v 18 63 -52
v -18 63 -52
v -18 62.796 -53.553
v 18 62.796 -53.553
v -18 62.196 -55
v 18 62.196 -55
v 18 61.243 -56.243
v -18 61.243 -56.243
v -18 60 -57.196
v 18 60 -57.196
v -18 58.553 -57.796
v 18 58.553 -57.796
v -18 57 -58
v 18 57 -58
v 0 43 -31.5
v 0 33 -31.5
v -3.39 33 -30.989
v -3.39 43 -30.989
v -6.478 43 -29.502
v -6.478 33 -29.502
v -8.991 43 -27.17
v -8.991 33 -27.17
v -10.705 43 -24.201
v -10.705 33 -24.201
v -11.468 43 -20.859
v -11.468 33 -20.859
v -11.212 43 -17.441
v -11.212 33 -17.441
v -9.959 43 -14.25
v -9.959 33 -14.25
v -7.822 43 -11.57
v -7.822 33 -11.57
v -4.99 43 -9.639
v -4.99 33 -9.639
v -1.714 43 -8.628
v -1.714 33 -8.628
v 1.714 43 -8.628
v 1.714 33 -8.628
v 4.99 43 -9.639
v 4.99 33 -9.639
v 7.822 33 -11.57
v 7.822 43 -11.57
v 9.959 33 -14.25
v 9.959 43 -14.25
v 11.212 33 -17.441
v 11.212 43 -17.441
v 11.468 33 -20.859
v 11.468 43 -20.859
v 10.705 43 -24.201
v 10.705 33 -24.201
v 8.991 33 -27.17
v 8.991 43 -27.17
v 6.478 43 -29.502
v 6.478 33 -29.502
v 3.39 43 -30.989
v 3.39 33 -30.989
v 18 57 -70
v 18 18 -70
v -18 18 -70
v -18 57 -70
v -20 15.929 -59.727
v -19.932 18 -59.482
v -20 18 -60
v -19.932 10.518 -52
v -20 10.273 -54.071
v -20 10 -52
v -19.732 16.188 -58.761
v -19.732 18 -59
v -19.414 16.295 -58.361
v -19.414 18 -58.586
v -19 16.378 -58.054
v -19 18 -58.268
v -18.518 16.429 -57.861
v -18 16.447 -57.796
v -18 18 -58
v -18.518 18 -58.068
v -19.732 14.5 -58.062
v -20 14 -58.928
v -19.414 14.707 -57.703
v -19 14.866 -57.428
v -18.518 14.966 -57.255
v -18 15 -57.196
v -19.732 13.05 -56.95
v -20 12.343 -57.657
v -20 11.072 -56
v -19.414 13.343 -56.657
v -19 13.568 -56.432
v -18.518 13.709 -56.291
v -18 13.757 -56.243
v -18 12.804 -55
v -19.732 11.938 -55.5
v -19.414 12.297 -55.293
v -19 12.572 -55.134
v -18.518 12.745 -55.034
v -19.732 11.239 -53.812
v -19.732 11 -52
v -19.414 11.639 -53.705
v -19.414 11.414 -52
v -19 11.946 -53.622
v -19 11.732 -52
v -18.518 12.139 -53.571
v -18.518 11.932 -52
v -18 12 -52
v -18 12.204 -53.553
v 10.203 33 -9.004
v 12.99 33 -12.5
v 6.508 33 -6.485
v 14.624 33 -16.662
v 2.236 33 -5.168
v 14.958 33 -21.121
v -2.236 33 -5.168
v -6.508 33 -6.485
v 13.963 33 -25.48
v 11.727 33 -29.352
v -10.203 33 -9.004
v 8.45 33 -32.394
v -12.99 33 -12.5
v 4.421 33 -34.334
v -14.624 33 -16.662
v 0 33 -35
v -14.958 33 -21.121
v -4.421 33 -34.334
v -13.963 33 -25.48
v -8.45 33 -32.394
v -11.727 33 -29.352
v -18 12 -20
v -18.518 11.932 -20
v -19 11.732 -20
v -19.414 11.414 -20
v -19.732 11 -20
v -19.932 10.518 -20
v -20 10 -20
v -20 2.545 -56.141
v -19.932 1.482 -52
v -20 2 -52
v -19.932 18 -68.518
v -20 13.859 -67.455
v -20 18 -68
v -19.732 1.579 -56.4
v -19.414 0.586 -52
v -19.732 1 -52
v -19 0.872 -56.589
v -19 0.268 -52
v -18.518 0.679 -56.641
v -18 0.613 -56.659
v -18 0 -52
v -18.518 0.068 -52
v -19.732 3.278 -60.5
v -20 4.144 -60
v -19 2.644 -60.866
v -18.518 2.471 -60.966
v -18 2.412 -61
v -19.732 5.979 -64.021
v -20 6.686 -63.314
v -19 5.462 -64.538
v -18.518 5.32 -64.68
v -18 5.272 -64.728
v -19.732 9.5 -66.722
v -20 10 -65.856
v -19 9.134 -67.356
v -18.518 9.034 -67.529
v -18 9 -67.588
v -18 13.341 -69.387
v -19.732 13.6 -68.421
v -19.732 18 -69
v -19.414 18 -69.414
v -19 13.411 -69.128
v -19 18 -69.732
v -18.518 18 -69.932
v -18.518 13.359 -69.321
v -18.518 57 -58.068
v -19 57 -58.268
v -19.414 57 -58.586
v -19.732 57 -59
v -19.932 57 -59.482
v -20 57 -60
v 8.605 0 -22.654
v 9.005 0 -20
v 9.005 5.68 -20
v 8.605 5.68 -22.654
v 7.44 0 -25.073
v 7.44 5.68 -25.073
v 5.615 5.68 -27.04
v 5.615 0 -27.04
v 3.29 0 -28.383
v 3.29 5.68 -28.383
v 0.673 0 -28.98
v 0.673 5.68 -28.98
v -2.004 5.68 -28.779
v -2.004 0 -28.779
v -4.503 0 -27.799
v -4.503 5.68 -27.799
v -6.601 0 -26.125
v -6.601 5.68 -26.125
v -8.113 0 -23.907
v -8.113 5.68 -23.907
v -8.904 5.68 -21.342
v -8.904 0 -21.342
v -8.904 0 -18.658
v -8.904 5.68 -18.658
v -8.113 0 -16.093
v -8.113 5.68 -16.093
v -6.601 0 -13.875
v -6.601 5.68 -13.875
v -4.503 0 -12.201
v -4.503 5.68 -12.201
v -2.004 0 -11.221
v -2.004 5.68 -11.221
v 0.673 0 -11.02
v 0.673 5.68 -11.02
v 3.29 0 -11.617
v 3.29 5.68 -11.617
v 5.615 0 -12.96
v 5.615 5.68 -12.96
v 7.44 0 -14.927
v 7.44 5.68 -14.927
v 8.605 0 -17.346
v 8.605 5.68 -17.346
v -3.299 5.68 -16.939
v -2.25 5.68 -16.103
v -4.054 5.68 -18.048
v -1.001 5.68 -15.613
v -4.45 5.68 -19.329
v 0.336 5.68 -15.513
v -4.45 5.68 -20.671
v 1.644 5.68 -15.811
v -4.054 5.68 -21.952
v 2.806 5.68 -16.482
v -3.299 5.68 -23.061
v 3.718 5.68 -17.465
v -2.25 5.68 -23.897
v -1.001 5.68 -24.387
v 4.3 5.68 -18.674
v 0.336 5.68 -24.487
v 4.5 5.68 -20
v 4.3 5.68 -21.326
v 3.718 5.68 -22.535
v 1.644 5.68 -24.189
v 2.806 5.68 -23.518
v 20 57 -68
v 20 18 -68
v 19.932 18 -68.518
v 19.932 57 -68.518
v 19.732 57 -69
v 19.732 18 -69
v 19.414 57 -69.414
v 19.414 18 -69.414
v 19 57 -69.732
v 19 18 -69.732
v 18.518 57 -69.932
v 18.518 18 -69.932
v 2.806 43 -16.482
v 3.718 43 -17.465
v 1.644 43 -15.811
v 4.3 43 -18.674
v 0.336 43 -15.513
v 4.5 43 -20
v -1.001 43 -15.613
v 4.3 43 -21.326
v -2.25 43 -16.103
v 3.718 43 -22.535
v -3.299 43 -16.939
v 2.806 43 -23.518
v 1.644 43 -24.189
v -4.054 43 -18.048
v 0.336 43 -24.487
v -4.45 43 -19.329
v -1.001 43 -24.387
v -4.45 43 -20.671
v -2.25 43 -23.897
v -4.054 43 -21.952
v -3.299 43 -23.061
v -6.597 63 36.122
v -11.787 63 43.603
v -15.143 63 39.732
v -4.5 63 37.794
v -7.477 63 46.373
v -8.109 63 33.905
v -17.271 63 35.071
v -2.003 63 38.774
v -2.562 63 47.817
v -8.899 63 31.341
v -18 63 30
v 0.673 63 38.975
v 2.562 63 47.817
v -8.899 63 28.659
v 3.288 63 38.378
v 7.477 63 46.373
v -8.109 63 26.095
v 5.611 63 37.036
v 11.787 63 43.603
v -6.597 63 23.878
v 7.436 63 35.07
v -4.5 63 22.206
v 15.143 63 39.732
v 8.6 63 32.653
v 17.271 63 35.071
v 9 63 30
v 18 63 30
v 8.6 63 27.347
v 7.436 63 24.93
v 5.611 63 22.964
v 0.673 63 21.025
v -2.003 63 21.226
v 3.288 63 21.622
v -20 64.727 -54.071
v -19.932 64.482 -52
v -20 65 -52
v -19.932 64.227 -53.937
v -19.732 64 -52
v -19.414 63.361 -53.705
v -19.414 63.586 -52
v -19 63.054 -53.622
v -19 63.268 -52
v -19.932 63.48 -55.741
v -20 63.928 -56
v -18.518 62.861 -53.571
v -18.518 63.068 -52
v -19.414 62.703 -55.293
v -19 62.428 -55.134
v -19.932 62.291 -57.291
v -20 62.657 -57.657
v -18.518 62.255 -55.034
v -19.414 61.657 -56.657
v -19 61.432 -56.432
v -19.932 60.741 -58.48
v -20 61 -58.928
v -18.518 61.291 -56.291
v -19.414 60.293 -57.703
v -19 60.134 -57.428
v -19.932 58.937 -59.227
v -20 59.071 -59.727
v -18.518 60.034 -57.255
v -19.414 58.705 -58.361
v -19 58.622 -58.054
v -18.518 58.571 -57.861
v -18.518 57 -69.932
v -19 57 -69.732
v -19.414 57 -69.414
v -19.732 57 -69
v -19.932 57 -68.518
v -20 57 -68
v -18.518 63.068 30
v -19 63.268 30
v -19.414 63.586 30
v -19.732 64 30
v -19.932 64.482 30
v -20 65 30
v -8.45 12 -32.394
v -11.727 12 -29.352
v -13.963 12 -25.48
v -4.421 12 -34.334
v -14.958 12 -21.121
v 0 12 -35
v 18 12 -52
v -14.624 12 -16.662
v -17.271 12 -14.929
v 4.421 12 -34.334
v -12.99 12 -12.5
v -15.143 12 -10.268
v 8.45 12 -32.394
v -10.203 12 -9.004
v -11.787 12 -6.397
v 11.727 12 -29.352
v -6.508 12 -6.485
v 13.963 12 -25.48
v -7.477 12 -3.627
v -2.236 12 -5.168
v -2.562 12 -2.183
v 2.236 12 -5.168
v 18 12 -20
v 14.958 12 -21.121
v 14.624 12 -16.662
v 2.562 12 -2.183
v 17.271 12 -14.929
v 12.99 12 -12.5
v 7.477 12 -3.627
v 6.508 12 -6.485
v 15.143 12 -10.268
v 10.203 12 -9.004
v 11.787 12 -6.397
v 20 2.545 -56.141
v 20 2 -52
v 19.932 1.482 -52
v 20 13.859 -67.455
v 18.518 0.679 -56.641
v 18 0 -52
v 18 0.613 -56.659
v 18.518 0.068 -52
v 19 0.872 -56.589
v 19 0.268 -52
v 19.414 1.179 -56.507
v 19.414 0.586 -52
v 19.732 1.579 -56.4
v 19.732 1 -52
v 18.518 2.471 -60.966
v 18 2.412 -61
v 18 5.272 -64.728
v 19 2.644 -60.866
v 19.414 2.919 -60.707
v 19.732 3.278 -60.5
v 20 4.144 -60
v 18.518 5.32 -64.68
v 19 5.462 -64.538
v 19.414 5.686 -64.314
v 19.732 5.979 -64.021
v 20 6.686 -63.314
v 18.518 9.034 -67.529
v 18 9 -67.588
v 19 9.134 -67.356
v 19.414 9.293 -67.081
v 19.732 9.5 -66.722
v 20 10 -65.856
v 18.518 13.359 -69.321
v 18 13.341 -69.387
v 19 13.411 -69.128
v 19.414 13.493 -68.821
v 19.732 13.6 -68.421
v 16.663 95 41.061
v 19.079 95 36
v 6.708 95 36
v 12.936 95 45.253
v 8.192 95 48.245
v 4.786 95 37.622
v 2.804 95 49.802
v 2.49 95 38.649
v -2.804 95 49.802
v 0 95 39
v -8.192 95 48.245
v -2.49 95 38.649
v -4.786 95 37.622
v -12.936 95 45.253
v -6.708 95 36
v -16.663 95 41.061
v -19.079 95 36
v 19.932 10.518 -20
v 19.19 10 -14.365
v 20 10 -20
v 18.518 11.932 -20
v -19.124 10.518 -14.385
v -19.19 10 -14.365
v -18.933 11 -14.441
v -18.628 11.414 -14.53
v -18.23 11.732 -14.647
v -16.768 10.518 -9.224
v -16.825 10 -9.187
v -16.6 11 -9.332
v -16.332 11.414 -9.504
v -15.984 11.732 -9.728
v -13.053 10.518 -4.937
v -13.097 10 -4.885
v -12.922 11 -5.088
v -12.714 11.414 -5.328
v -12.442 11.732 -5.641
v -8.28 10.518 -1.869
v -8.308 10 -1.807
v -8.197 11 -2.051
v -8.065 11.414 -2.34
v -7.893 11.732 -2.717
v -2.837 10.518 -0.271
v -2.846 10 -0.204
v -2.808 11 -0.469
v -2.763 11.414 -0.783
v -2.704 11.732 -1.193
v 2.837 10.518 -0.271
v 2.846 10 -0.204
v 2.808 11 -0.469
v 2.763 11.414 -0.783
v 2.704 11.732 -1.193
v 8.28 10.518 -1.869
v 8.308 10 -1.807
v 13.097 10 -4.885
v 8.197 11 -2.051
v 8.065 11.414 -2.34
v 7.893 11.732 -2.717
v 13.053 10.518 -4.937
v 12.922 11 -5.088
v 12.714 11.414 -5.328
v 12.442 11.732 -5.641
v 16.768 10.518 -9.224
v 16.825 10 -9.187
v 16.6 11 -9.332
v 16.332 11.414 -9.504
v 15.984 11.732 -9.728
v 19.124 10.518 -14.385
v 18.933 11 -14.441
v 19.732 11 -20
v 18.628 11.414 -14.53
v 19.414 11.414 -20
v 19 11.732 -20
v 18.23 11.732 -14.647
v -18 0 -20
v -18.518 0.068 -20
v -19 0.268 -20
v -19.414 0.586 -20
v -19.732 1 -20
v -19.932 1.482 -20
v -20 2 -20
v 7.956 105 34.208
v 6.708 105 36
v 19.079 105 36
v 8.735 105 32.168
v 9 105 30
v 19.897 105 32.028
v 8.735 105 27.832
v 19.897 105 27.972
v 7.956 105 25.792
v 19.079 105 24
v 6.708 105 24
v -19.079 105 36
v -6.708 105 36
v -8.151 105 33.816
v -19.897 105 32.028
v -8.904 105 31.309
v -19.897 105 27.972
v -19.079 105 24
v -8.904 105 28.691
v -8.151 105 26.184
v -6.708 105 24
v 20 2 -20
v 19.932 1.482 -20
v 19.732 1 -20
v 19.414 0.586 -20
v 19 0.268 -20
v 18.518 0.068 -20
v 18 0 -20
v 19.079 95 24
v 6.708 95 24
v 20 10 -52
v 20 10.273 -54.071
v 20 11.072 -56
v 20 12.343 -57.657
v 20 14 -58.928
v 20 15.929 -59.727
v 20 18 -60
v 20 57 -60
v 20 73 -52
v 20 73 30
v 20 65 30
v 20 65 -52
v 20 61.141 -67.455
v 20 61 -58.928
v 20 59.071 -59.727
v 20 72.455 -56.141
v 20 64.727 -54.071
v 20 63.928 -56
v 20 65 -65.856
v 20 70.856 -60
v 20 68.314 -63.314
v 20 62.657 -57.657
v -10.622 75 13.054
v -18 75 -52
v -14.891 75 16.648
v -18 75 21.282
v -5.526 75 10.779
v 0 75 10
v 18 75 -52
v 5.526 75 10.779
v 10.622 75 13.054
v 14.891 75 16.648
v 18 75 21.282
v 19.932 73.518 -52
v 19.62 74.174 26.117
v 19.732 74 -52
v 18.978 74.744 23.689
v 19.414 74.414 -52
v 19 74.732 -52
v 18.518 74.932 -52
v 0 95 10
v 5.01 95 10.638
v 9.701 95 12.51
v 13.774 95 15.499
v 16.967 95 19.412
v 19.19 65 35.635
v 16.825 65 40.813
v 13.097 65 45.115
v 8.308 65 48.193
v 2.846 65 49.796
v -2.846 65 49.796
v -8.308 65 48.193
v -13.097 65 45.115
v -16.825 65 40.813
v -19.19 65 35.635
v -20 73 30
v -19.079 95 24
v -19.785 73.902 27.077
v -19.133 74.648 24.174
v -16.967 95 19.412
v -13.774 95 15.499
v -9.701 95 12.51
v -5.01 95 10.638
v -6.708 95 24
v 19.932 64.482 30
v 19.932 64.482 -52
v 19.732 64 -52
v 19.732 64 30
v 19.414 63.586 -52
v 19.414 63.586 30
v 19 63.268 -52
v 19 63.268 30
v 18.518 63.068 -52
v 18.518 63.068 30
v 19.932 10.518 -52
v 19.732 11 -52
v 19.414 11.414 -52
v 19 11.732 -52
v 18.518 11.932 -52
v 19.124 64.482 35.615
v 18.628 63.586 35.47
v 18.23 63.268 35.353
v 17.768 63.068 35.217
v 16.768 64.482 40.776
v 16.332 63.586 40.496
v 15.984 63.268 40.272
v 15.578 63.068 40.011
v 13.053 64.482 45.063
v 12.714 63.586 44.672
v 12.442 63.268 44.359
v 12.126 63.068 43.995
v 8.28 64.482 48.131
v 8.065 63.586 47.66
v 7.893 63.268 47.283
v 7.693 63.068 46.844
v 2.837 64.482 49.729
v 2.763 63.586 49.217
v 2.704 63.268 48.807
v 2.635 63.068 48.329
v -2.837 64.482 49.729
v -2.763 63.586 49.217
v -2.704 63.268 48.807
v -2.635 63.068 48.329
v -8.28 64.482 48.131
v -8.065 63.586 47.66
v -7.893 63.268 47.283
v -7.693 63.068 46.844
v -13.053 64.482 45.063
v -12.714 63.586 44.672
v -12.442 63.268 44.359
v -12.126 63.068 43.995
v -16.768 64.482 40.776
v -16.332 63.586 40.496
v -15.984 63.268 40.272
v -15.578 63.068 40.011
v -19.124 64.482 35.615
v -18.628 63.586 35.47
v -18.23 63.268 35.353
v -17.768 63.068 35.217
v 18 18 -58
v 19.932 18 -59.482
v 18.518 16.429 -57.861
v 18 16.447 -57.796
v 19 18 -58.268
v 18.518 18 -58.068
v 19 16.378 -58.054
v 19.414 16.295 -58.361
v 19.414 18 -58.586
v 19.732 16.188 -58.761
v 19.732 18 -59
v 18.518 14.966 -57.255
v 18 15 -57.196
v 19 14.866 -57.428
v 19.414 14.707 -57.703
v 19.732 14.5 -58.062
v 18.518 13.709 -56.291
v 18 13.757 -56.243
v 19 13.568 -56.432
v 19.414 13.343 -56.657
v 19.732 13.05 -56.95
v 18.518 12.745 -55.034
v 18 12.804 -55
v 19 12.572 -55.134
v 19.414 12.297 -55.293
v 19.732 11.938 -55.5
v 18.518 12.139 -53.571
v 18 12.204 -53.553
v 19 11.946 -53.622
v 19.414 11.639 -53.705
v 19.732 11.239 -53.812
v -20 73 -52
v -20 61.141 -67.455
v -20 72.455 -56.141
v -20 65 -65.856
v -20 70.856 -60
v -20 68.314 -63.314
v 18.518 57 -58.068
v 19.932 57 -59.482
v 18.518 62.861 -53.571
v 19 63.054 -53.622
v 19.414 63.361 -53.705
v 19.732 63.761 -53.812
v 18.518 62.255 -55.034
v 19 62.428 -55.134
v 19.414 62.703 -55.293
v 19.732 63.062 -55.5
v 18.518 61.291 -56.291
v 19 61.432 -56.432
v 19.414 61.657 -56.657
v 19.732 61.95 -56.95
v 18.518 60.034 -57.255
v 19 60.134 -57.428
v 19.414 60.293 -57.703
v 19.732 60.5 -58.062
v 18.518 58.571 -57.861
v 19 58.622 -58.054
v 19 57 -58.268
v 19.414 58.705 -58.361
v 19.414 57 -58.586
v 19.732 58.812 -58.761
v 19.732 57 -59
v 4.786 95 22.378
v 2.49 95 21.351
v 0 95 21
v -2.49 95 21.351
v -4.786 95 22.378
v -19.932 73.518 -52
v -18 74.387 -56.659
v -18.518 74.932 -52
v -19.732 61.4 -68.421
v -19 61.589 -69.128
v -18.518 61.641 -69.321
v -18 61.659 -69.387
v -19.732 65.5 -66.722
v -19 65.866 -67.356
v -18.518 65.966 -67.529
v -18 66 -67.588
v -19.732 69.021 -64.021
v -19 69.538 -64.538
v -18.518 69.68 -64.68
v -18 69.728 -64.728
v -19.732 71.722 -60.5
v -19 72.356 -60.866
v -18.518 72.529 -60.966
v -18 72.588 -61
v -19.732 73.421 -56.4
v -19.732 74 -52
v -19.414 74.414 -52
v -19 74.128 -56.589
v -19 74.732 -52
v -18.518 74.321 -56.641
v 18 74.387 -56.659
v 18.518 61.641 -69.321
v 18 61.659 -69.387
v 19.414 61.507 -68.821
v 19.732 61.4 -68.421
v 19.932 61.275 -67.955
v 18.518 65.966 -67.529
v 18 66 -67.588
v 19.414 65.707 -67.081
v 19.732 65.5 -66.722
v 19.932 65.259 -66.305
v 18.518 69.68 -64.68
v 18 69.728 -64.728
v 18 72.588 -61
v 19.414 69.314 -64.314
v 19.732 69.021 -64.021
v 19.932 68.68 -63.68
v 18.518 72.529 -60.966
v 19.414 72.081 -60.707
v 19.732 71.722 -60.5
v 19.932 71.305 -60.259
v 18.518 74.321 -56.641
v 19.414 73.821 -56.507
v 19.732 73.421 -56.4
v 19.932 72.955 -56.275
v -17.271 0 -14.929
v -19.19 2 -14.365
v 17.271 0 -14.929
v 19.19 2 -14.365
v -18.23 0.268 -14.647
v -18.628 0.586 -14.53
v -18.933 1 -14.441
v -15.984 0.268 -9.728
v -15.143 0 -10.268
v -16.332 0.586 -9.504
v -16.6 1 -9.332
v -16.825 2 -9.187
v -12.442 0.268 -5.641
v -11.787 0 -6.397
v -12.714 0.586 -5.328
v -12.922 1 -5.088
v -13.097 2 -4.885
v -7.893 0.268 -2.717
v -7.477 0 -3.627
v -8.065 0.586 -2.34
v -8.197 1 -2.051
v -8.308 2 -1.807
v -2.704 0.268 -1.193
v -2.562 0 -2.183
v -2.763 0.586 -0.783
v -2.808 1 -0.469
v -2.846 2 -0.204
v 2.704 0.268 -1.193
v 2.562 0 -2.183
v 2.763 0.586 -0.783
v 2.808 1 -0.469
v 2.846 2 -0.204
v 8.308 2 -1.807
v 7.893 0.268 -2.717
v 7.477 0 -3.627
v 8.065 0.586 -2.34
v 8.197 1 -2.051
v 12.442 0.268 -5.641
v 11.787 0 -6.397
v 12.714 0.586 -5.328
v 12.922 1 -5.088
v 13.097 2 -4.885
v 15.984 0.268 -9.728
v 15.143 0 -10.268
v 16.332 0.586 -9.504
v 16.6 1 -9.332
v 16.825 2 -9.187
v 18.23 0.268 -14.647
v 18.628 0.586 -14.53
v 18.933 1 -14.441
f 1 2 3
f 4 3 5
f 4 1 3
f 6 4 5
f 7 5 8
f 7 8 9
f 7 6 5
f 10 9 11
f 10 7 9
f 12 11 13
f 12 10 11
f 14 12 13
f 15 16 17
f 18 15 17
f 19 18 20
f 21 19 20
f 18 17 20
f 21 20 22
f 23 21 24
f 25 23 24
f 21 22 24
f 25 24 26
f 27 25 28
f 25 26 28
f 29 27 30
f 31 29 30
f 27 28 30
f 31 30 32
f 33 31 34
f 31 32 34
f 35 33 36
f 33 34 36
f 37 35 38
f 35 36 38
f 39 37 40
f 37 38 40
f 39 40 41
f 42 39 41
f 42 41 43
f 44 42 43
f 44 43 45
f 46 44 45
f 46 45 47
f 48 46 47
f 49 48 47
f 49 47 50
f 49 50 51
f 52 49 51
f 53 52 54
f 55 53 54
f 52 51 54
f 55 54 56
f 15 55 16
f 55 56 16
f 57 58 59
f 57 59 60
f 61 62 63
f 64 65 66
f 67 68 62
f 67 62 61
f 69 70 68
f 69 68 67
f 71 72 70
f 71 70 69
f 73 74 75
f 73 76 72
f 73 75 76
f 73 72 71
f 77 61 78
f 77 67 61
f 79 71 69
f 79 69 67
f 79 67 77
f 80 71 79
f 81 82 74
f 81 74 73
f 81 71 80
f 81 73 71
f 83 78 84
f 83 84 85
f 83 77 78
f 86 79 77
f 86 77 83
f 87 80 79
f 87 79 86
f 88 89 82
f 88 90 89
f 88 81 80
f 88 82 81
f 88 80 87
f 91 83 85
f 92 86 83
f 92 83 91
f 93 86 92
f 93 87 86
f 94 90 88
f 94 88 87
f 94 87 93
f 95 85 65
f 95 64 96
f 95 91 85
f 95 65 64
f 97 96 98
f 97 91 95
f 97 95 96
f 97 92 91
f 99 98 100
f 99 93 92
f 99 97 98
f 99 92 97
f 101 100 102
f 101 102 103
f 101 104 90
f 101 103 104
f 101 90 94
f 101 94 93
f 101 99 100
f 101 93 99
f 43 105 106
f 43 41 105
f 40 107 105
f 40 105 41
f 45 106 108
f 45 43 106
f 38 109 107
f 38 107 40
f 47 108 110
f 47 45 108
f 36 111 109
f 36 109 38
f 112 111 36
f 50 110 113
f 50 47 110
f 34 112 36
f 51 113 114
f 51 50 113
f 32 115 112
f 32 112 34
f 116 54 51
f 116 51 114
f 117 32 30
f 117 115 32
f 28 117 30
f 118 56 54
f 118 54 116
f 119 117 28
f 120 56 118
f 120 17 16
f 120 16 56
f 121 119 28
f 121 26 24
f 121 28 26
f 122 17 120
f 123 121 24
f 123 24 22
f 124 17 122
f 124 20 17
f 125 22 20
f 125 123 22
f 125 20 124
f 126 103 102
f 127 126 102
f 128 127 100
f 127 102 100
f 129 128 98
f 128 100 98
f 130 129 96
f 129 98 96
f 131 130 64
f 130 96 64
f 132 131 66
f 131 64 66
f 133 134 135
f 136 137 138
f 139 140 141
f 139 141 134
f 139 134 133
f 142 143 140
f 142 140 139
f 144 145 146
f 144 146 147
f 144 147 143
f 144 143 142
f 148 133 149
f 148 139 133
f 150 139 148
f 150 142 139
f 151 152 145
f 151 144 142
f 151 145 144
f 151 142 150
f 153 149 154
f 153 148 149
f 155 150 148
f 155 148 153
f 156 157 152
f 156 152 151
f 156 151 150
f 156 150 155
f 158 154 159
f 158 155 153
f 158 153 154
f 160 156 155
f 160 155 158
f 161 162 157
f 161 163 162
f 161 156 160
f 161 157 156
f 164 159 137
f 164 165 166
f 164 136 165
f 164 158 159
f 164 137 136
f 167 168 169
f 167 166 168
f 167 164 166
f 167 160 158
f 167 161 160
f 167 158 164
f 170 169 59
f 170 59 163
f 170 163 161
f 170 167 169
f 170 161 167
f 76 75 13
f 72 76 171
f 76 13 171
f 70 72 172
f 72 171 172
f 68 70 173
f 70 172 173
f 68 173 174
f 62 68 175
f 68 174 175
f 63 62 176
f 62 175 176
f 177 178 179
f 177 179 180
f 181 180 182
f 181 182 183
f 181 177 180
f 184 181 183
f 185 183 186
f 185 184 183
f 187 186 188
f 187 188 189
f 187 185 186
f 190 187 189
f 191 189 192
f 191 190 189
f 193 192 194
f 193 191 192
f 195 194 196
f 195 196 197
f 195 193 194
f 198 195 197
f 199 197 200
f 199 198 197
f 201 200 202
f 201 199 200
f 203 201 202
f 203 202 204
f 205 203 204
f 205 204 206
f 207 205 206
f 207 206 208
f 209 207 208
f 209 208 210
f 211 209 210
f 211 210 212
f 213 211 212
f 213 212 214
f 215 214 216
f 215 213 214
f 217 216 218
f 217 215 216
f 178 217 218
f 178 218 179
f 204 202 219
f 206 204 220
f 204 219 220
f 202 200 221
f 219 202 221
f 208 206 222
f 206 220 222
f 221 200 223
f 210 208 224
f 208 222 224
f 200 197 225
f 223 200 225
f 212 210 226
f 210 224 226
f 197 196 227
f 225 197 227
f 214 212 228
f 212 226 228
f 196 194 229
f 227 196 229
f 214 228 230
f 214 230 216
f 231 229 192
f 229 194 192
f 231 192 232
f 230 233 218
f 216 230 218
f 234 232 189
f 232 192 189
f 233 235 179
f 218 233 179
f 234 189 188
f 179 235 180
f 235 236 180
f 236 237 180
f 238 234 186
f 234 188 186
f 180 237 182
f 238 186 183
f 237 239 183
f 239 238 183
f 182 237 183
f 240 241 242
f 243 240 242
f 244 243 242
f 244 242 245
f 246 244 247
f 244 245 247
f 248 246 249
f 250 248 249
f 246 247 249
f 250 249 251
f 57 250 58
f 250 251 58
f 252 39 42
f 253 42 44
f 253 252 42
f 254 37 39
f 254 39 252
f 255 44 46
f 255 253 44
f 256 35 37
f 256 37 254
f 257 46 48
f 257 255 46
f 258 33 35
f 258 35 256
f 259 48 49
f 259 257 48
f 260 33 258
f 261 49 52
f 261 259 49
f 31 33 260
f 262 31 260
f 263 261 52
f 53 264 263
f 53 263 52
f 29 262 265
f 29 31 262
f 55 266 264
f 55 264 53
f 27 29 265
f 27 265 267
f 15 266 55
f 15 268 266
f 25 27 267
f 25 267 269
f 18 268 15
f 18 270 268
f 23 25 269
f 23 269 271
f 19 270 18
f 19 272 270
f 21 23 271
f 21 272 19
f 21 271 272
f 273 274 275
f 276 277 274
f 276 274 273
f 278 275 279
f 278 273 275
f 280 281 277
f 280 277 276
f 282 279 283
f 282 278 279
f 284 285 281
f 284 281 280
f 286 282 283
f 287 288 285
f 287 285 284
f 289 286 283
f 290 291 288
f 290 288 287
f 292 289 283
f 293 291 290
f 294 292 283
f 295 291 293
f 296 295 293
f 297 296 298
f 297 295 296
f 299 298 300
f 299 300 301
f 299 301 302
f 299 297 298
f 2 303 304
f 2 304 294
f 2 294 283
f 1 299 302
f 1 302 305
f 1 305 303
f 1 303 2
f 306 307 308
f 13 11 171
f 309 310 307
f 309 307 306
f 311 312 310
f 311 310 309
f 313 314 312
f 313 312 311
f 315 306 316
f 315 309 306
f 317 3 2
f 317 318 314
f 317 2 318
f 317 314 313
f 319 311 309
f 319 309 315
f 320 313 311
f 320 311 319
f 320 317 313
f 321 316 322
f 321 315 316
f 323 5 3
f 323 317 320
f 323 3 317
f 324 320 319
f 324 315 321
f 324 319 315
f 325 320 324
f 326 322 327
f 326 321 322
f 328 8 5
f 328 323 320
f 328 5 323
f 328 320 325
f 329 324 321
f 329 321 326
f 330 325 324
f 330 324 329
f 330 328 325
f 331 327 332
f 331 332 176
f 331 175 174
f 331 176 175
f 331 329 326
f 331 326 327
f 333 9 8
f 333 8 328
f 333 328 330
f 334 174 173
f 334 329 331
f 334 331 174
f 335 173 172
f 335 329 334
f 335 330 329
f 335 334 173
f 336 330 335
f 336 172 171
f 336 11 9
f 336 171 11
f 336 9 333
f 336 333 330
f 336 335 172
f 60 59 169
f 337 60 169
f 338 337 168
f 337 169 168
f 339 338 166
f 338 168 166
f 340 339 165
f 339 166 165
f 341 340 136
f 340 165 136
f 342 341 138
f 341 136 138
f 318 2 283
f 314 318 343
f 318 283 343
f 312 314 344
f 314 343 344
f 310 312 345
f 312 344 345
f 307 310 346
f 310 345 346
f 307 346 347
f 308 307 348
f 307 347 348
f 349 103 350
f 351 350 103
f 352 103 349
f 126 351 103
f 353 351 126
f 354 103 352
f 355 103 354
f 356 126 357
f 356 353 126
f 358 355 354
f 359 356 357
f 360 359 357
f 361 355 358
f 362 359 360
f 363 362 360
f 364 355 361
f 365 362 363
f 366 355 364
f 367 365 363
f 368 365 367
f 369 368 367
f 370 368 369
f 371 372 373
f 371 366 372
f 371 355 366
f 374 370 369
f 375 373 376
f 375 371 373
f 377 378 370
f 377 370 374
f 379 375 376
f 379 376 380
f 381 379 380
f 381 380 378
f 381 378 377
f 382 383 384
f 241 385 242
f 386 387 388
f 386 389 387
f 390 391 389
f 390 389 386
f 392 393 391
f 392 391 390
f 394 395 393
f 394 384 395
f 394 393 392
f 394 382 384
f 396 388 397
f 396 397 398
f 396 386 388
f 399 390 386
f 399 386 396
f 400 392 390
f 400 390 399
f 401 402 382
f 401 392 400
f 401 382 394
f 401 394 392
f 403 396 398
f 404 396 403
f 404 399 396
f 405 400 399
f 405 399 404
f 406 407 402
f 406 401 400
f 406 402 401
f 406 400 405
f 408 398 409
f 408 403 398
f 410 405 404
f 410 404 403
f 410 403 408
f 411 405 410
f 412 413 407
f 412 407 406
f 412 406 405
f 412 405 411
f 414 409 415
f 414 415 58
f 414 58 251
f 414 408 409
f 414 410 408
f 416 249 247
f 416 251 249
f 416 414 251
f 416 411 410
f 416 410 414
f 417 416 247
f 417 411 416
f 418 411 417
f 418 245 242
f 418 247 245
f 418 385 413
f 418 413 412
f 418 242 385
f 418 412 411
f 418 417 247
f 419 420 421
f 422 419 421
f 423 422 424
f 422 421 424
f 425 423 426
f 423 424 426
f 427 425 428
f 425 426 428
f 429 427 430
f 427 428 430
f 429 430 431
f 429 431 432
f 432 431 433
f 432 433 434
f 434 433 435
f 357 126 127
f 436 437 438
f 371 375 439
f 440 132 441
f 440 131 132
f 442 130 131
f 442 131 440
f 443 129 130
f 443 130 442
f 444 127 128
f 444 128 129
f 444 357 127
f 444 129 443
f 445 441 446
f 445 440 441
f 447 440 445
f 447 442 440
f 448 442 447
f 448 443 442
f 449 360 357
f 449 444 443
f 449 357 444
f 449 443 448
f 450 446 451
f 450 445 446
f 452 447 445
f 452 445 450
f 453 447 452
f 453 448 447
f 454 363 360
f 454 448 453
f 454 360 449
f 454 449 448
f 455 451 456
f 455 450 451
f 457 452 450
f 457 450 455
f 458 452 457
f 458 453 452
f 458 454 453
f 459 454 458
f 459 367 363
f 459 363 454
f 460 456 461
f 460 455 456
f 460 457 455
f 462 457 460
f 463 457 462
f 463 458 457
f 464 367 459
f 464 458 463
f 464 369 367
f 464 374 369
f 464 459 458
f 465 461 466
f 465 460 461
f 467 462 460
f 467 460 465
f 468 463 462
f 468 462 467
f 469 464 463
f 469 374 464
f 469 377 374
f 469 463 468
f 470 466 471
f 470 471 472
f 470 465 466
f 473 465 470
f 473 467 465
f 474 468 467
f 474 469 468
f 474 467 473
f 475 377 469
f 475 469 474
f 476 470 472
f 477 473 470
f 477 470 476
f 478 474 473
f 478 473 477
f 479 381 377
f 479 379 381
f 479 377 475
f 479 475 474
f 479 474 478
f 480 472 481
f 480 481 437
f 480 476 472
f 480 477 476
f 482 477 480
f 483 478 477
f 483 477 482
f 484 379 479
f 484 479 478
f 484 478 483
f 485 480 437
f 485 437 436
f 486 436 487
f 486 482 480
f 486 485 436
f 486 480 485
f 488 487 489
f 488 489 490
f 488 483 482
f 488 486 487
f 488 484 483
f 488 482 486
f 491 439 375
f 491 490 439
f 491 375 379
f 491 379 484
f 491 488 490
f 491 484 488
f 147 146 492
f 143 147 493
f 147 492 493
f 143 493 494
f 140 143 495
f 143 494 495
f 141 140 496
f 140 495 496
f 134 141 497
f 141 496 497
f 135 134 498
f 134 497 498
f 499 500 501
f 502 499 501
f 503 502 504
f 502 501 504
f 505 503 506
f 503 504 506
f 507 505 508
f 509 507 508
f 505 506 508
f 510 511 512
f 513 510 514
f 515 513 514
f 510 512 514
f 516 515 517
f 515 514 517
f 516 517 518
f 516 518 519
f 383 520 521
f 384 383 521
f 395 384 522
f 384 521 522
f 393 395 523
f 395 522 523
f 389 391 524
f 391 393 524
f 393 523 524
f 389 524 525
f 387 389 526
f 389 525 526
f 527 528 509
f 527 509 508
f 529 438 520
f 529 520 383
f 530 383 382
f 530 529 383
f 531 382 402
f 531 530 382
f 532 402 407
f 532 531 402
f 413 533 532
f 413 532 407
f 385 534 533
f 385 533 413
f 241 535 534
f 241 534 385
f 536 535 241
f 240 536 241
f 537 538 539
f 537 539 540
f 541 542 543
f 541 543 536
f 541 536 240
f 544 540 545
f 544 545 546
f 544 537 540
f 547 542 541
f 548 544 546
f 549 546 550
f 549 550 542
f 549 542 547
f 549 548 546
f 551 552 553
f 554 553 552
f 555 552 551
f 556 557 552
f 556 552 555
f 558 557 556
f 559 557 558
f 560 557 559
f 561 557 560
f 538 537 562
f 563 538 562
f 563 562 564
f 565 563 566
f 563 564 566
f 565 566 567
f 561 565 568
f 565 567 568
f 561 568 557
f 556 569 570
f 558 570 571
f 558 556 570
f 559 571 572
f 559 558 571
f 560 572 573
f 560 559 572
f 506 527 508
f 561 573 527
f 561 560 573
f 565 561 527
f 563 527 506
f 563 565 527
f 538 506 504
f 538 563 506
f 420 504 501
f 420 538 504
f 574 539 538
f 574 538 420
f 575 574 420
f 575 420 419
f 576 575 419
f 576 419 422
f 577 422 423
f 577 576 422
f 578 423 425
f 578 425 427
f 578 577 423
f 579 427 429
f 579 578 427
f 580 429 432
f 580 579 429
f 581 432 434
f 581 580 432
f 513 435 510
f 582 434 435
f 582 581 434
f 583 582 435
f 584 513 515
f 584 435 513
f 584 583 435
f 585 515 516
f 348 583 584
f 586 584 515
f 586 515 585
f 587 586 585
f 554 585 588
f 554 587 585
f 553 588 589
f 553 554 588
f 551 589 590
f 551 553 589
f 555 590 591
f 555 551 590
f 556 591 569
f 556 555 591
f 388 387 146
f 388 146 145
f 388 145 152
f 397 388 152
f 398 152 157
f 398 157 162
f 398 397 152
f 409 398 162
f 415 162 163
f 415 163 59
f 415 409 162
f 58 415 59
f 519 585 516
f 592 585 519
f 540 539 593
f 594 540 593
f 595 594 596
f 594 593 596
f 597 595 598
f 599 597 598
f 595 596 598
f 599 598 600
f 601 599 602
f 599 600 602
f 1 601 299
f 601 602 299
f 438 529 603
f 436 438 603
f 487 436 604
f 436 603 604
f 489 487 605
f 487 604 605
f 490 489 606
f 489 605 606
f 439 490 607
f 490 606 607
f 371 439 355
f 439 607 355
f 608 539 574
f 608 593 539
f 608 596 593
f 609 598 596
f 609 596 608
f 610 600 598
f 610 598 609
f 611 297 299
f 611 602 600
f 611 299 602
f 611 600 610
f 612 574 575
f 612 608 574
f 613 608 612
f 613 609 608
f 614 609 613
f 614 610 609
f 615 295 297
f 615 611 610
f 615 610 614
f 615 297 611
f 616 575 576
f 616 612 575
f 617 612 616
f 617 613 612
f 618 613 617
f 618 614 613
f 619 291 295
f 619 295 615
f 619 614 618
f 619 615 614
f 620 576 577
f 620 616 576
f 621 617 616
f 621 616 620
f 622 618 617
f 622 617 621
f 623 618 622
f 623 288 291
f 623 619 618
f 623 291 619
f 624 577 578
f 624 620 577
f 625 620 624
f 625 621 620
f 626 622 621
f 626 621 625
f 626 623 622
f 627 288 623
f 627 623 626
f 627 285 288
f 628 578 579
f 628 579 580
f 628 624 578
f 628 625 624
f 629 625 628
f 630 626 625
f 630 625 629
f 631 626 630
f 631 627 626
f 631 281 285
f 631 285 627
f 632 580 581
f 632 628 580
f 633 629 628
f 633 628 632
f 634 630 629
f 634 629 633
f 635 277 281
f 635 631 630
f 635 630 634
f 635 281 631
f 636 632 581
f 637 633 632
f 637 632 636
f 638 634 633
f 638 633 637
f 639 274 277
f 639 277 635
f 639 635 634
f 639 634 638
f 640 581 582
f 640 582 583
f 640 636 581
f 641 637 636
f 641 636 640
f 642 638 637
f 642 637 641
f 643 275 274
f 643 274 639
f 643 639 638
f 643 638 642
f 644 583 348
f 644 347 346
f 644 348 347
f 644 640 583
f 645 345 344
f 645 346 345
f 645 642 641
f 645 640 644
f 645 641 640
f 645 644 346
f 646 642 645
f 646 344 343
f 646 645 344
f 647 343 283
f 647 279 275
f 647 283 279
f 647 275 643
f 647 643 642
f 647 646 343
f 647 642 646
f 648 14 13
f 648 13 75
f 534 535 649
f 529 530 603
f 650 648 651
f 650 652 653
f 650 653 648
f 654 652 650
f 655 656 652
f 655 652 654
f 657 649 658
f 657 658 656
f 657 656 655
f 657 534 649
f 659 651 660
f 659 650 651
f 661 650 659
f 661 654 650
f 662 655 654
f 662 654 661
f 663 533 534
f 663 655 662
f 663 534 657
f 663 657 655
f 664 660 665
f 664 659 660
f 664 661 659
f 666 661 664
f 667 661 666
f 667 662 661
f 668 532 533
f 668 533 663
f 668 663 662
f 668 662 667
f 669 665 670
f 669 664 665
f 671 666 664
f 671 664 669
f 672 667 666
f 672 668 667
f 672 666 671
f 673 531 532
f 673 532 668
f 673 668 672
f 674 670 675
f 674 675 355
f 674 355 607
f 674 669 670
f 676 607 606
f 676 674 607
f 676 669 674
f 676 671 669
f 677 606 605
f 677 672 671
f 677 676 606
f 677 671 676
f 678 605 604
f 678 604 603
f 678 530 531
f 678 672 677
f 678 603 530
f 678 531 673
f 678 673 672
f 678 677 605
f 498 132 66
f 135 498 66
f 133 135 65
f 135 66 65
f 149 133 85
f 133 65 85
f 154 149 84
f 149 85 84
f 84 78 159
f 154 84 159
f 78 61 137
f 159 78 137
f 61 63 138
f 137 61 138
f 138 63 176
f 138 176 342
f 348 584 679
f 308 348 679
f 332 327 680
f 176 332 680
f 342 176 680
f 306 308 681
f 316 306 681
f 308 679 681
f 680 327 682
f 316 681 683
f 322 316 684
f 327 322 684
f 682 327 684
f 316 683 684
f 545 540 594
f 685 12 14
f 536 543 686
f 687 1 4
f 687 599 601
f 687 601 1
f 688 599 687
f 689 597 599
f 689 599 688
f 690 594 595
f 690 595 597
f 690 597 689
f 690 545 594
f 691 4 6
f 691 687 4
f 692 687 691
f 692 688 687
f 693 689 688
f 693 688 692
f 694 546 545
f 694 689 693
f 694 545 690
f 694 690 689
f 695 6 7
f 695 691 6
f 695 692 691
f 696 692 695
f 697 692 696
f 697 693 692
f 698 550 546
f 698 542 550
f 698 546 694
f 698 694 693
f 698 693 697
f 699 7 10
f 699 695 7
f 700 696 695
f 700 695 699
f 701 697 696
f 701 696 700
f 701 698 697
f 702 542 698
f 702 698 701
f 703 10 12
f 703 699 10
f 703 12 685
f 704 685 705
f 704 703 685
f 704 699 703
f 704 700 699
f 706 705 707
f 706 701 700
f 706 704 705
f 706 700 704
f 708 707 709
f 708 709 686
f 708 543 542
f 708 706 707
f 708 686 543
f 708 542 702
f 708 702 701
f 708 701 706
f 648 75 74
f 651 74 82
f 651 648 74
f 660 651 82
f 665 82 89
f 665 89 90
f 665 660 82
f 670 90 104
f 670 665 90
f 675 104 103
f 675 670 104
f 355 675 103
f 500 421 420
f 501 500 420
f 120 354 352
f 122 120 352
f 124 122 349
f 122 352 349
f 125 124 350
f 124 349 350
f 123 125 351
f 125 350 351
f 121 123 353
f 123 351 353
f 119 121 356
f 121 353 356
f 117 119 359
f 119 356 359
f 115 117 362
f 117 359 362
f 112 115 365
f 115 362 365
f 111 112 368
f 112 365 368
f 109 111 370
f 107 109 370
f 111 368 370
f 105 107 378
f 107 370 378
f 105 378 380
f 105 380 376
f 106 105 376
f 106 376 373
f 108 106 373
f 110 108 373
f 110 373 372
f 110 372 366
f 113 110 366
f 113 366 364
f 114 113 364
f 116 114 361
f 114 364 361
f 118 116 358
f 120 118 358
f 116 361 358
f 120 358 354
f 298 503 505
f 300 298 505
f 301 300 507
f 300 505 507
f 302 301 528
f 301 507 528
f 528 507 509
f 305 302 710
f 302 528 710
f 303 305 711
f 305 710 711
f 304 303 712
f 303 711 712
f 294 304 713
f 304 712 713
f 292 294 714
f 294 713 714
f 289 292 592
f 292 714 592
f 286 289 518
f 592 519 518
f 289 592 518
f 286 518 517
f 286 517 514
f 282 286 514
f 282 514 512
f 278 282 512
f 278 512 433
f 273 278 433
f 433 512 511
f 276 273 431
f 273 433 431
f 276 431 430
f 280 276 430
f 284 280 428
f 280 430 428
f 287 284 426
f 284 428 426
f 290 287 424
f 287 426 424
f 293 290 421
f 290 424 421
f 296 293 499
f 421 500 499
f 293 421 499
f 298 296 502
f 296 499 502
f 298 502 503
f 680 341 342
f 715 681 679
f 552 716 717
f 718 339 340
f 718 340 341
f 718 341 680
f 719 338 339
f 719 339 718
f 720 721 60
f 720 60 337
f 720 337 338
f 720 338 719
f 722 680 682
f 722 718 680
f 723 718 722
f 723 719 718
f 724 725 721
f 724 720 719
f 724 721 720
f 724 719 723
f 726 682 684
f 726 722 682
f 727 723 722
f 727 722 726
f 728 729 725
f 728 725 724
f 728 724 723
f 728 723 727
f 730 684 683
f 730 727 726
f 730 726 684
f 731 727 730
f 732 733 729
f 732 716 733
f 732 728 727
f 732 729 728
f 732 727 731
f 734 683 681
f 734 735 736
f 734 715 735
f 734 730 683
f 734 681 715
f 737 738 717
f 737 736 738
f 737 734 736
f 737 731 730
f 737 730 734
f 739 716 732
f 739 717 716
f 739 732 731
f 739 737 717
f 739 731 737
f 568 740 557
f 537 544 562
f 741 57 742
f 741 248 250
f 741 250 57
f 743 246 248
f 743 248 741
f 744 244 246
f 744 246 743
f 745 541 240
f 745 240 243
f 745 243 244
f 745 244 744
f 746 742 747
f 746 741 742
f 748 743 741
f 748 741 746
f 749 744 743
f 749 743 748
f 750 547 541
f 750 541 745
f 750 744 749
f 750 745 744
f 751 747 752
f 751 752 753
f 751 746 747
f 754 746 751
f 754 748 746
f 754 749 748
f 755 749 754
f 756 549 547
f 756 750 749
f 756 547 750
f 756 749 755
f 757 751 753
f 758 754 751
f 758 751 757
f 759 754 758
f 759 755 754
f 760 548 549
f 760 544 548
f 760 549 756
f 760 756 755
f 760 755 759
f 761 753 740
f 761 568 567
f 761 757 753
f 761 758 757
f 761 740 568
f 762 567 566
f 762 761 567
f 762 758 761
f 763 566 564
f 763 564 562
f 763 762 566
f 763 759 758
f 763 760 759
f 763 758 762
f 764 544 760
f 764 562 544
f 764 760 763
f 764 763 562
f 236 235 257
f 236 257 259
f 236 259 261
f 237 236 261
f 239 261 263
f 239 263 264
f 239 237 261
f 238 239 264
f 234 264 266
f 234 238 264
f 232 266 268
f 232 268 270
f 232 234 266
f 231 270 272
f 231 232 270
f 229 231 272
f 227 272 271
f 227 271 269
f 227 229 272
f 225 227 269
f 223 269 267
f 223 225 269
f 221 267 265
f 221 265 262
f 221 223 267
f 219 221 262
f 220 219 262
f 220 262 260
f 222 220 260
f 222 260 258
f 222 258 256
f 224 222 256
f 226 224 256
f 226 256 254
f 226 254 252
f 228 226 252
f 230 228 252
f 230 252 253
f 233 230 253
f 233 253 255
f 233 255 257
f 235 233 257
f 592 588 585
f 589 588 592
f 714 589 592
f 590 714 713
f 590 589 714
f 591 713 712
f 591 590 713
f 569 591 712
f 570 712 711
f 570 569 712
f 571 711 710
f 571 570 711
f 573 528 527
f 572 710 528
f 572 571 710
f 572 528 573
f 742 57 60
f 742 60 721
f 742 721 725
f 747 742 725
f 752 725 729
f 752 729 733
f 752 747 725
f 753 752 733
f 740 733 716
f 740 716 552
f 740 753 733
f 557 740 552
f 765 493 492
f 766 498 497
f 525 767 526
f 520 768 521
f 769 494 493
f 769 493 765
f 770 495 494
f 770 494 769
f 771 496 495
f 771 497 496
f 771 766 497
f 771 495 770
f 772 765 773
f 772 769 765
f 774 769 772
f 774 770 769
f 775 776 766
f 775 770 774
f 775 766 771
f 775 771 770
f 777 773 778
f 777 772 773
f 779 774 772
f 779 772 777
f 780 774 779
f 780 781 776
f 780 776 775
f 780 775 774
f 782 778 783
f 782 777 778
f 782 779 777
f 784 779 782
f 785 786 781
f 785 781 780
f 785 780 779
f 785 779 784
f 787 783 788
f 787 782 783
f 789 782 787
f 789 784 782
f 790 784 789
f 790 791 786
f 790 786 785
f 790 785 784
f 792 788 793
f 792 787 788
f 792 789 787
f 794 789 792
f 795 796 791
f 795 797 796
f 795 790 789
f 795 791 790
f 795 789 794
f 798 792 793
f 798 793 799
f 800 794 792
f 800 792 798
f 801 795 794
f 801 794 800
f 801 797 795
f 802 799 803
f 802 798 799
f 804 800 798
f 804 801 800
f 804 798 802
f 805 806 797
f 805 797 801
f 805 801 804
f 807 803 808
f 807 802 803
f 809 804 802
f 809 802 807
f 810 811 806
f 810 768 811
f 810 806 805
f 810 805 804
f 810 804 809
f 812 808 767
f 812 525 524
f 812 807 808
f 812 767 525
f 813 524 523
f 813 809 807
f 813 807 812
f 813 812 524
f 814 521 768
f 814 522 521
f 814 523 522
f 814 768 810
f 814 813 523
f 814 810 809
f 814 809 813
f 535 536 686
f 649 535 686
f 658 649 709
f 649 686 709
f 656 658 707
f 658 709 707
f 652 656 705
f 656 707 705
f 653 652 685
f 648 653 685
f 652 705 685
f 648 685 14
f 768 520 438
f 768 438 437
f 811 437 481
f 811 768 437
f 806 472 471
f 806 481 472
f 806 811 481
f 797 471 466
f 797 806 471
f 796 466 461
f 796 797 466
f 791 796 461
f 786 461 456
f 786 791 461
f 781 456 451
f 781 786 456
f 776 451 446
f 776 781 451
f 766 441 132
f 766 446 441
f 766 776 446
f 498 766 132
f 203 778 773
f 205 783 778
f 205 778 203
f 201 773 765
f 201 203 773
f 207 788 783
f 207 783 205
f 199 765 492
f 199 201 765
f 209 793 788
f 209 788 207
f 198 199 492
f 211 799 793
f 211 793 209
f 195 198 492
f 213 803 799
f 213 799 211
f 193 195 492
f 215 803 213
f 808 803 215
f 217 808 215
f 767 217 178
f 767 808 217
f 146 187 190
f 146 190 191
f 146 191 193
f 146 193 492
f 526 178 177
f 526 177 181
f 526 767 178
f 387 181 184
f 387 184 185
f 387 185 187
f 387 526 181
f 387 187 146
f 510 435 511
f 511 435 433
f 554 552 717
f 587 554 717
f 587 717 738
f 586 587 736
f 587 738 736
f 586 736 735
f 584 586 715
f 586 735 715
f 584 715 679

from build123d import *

# Parameters (mm, degrees)
EXTRUDE_THIN1_DEPTH                       = 20
SKETCH2_R                                 = 20
BOSS_EXTRUDE1_DEPTH                       = 42
FILLET1_RADIUS                            = 20
FILLET1_LENGTH                            = 12
SKETCH3_R                                 = 15
BOSS_EXTRUDE2_DEPTH                       = 21
SKETCH4_R                                 = 11.5
BOSS_EXTRUDE3_DEPTH                       = 10
CUT_EXTRUDE1_START                        = -10
CUT_EXTRUDE1_DEPTH                        = 10
F_18_0_18_DIAMETER_HOLE1_D                = 18
CBORE_FOR_M8_HEX_HEAD_BOLT1_OUTLINE_R     = 4.5
CBORE_FOR_M8_HEX_HEAD_BOLT1_DEPTH         = 43
CBORE_FOR_M8_HEX_HEAD_BOLT1_2_OUTLINE_R   = 9.005
CBORE_FOR_M8_HEX_HEAD_BOLT1_2_OUTLINE_R_2 = 4.5
CBORE_FOR_M8_HEX_HEAD_BOLT1_2_DEPTH       = 5.68
FILLET2_R                                 = 2


# Read off the part's stored shape, not the designer's step: CBORE for M8 Hex Head Bolt1
with BuildPart() as part:
    # Sketch1 → Extrude-Thin1 (new, symmetric)
    with BuildSketch(Plane(origin=(0, 0, 0), x_dir=(0, 0, -1), z_dir=(1, 0, 0))):
        with BuildLine():
            Line((0, 0), (52, 0))
            ThreePointArc((52, 0), (64.727922061, 5.272077939), (70, 18))
            Line((70, 18), (70, 57))
            ThreePointArc((70, 57), (64.727922061, 69.727922061), (52, 75))
            Line((52, 75), (-30, 75))
            Line((-30, 75), (-30, 63))
            Line((-30, 63), (52, 63))
            ThreePointArc((52, 63), (56.242640687, 61.242640687), (58, 57))
            Line((58, 57), (58, 18))
            ThreePointArc((58, 18), (56.242640687, 13.757359313), (52, 12))
            Line((52, 12), (0, 12))
            Line((0, 12), (0, 0))
        make_face()
    extrude(amount=EXTRUDE_THIN1_DEPTH, both=True)

    # Sketch2 → Boss-Extrude1 (add)
    with BuildSketch(Plane.XZ.offset(-63)):
        with Locations(Location((0, 30, 0), (0, 0, 270))):
            Circle(SKETCH2_R)
    extrude(amount=-BOSS_EXTRUDE1_DEPTH)

    # Fillet1: full round fillet: the end face becomes a half cylinder, R = half its width
    fillet1_face = Plane((0, 6, 0), x_dir=(0, -1, 0), z_dir=(0, 0, 1))  # on the end face: x along it, z out of the body
    fillet1_slab = fillet1_face.offset(-FILLET1_RADIUS / 2) * Box(FILLET1_LENGTH, 2 * FILLET1_RADIUS, FILLET1_RADIUS, mode=Mode.PRIVATE)  # the body's end, R deep
    fillet1_round = Plane((0, 6, -20), x_dir=(0, 0, 1), z_dir=(0, -1, 0)) * Cylinder(FILLET1_RADIUS, FILLET1_LENGTH, mode=Mode.PRIVATE)  # its axis R under the face
    add(fillet1_slab - fillet1_round, mode=Mode.SUBTRACT)

    # Sketch3 → Boss-Extrude2 (add)
    with BuildSketch(Plane(origin=(0, 12, 0), x_dir=(1, 0, 0), z_dir=(0, 1, 0))):
        with Locations(Location((0, 20, 0), (0, 0, 90))):
            Circle(SKETCH3_R)
    extrude(amount=BOSS_EXTRUDE2_DEPTH)

    # Sketch4 → Boss-Extrude3 (add)
    with BuildSketch(Plane(origin=(0, 33, 0), x_dir=(1, 0, 0), z_dir=(0, 1, 0))):
        with Locations(Location((0, 20, 0), (0, 0, 90))):
            Circle(SKETCH4_R)
    extrude(amount=BOSS_EXTRUDE3_DEPTH)

    # Sketch5 → Cut-Extrude1 (cut)
    with BuildSketch(Plane(origin=(0, 105, 0), x_dir=(1, 0, 0), z_dir=(0, 1, 0)).offset(CUT_EXTRUDE1_START)):
        with BuildLine():
            Line((-19.078784028, -24), (19.078784028, -24))
            ThreePointArc((19.078784028, -24), (0, -10), (-19.078784028, -24))
        make_face()
        with BuildLine():
            Line((-19.078784028, -36), (19.078784028, -36))
            ThreePointArc((19.078784028, -36), (0, -50), (-19.078784028, -36))
        make_face()
    extrude(amount=CUT_EXTRUDE1_DEPTH, mode=Mode.SUBTRACT)

    # Ø18.0 (18) Diameter Hole1 (through all)
    with Locations(Plane(origin=(0, 63, 0), x_dir=(-1, 0, 0), z_dir=(0, -1, 0))):
        with Locations((0, -30)):
            Hole(F_18_0_18_DIAMETER_HOLE1_D / 2)

    # CBORE for M8 Hex Head Bolt1 outline → CBORE for M8 Hex Head Bolt1 (cut)
    with BuildSketch(Plane(origin=(0, 0, 0), x_dir=(1, 0, 0), z_dir=(0, 1, 0))):
        with Locations((0, 20)):
            Circle(CBORE_FOR_M8_HEX_HEAD_BOLT1_OUTLINE_R)
    extrude(amount=CBORE_FOR_M8_HEX_HEAD_BOLT1_DEPTH, mode=Mode.SUBTRACT)

    # CBORE for M8 Hex Head Bolt1 2 outline → CBORE for M8 Hex Head Bolt1 2 (cut)
    with BuildSketch(Plane(origin=(0, 0, 0), x_dir=(1, 0, 0), z_dir=(0, 1, 0))):
        with Locations((0, 20)):
            Circle(CBORE_FOR_M8_HEX_HEAD_BOLT1_2_OUTLINE_R)
        with Locations((0, 20)):
            Circle(CBORE_FOR_M8_HEX_HEAD_BOLT1_2_OUTLINE_R_2, mode=Mode.SUBTRACT)
    extrude(amount=CBORE_FOR_M8_HEX_HEAD_BOLT1_2_DEPTH, mode=Mode.SUBTRACT)

    # Fillet2
    # the kernel refuses this fillet: 2 mm, written as the material it takes off along each edge
    with BuildSketch(Plane(origin=(20, 63, 30), x_dir=(0, 1, 0), z_dir=(0, 0, -1))) as fillet2_piece_1:
        with BuildLine():
            CenterArc((FILLET2_R, -FILLET2_R), FILLET2_R, 90, 90)
            Line((0, -FILLET2_R), (0, 0))
            Line((0, 0), (FILLET2_R, 0))
        make_face()
    extrude(amount=82, mode=Mode.SUBTRACT)
    with BuildSketch(Plane(origin=(-20, 18, -52), x_dir=(0, 0, -1), z_dir=(0, 1, 0))) as fillet2_piece_2:
        with BuildLine():
            CenterArc((6 + FILLET2_R, -FILLET2_R), FILLET2_R, 90, 90)
            Line((6 + FILLET2_R, 0), (6, 0))
            Line((6, 0), (6, -FILLET2_R))
        make_face()
    revolve(axis=Axis((-20, 18, -52), (-1, 0, 0)), revolution_arc=90, mode=Mode.SUBTRACT)
    with BuildSketch(Plane(origin=(-20, 57, -58), x_dir=(0, 0, -1), z_dir=(0, -1, 0)), Plane(origin=(-20, 18, -70), x_dir=(0, 0, 1), z_dir=(0, 1, 0))) as fillet2_piece_3:
        with BuildLine():
            CenterArc((FILLET2_R, FILLET2_R), FILLET2_R, 180, 90)
            Line((0, FILLET2_R), (0, 0))
            Line((0, 0), (FILLET2_R, 0))
        make_face()
    extrude(amount=39, mode=Mode.SUBTRACT)
    with BuildSketch(Plane(origin=(-20, 57, -52), x_dir=(0, 1, 0), z_dir=(0, 0, 1))) as fillet2_piece_4:
        with BuildLine():
            CenterArc((6 + FILLET2_R, -FILLET2_R), FILLET2_R, 90, 90)
            Line((6, -FILLET2_R), (6, 0))
            Line((6, 0), (6 + FILLET2_R, 0))
        make_face()
    revolve(axis=Axis((-20, 57, -52), (-1, 0, 0)), revolution_arc=90, mode=Mode.SUBTRACT)
    with BuildSketch(Plane(origin=(-20, 63, 30), x_dir=(0, 1, 0), z_dir=(0, 0, -1))) as fillet2_piece_5:
        with BuildLine():
            CenterArc((FILLET2_R, FILLET2_R), FILLET2_R, 180, 90)
            Line((0, FILLET2_R), (0, 0))
            Line((0, 0), (FILLET2_R, 0))
        make_face()
    extrude(amount=82, mode=Mode.SUBTRACT)
    with BuildSketch(Plane(origin=(-20, 75, -52), x_dir=(0, -1, 0), z_dir=(0, 0, 1))) as fillet2_piece_6_section:
        with BuildLine():
            CenterArc((FILLET2_R, FILLET2_R), FILLET2_R, 180, 90)
            Line((0, FILLET2_R), (0, 0))
            Line((0, 0), (FILLET2_R, 0))
        make_face()
    fillet2_piece_6 = extrude(amount=87, mode=Mode.PRIVATE)
    fillet2_piece_6 = fillet2_piece_6 - Plane(origin=(0, 74.534164155, 30), x_dir=(0, 0, -1), z_dir=(0, -1, 0)) * Cylinder(20, 182, mode=Mode.PRIVATE)
    add(fillet2_piece_6, mode=Mode.SUBTRACT)
    with BuildSketch(Plane(origin=(20, 57, -52), x_dir=(0, 1, 0), z_dir=(0, 0, 1))) as fillet2_piece_7:
        with BuildLine():
            CenterArc((6 + FILLET2_R, FILLET2_R), FILLET2_R, 180, 90)
            Line((6, FILLET2_R), (6, 0))
            Line((6, 0), (6 + FILLET2_R, 0))
        make_face()
    revolve(axis=Axis((20, 57, -52), (-1, 0, 0)), revolution_arc=90, mode=Mode.SUBTRACT)
    with BuildSketch(Plane(origin=(20, 57, -58), x_dir=(0, 0, -1), z_dir=(0, -1, 0)), Plane(origin=(20, 18, -70), x_dir=(0, 0, 1), z_dir=(0, 1, 0))) as fillet2_piece_8:
        with BuildLine():
            CenterArc((FILLET2_R, -FILLET2_R), FILLET2_R, 90, 90)
            Line((0, -FILLET2_R), (0, 0))
            Line((0, 0), (FILLET2_R, 0))
        make_face()
    extrude(amount=39, mode=Mode.SUBTRACT)
    with BuildSketch(Plane(origin=(20, 18, -52), x_dir=(0, 0, -1), z_dir=(0, 1, 0))) as fillet2_piece_9:
        with BuildLine():
            CenterArc((6 + FILLET2_R, FILLET2_R), FILLET2_R, 180, 90)
            Line((6 + FILLET2_R, 0), (6, 0))
            Line((6, 0), (6, FILLET2_R))
        make_face()
    revolve(axis=Axis((20, 18, -52), (-1, 0, 0)), revolution_arc=90, mode=Mode.SUBTRACT)
    with BuildSketch(Plane(origin=(20, 18, -52), x_dir=(0, -1, 0), z_dir=(0, 0, 1))) as fillet2_piece_10:
        with BuildLine():
            CenterArc((18 - FILLET2_R, -FILLET2_R), FILLET2_R, 0, 90)
            Line((18, -FILLET2_R), (18, 0))
            Line((18, 0), (18 - FILLET2_R, 0))
        make_face()
    revolve(axis=Axis((20, 18, -52), (1, 0, 0)), revolution_arc=90, mode=Mode.SUBTRACT)
    with BuildSketch(Plane(origin=(0, 63, 30), x_dir=(1, 0, 0), z_dir=(0, 0, -1))) as fillet2_piece_11:
        with BuildLine():
            CenterArc((20 - FILLET2_R, -FILLET2_R), FILLET2_R, 0, 90)
            Line((20, -FILLET2_R), (20, 0))
            Line((20, 0), (20 - FILLET2_R, 0))
        make_face()
    revolve(axis=Axis((0, 63, 30), (0, -1, 0)), revolution_arc=180, mode=Mode.SUBTRACT)
    with BuildSketch(Plane(origin=(20, 57, -52), x_dir=(0, 0, -1), z_dir=(0, -1, 0))) as fillet2_piece_12:
        with BuildLine():
            CenterArc((18 - FILLET2_R, -FILLET2_R), FILLET2_R, 0, 90)
            Line((18, -FILLET2_R), (18, 0))
            Line((18, 0), (18 - FILLET2_R, 0))
        make_face()
    revolve(axis=Axis((20, 57, -52), (1, 0, 0)), revolution_arc=90, mode=Mode.SUBTRACT)
    with BuildSketch(Plane(origin=(20, 12, -52), x_dir=(-1, 0, 0), z_dir=(0, 0, 1)), Plane(origin=(-20, 0, -20), x_dir=(0, 1, 0), z_dir=(0, 0, -1))) as fillet2_piece_13:
        with BuildLine():
            CenterArc((FILLET2_R, FILLET2_R), FILLET2_R, 180, 90)
            Line((0, FILLET2_R), (0, 0))
            Line((0, 0), (FILLET2_R, 0))
        make_face()
    extrude(amount=32, mode=Mode.SUBTRACT)
    with BuildSketch(Plane(origin=(20, 0, -20), x_dir=(0, 1, 0), z_dir=(0, 0, -1)), Plane(origin=(-20, 12, -52), x_dir=(1, 0, 0), z_dir=(0, 0, 1))) as fillet2_piece_14:
        with BuildLine():
            CenterArc((FILLET2_R, -FILLET2_R), FILLET2_R, 90, 90)
            Line((0, -FILLET2_R), (0, 0))
            Line((0, 0), (FILLET2_R, 0))
        make_face()
    extrude(amount=32, mode=Mode.SUBTRACT)
    with BuildSketch(Plane(origin=(20, 75, -52), x_dir=(0, -1, 0), z_dir=(0, 0, 1))) as fillet2_piece_15_section:
        with BuildLine():
            CenterArc((FILLET2_R, -FILLET2_R), FILLET2_R, 90, 90)
            Line((0, -FILLET2_R), (0, 0))
            Line((0, 0), (FILLET2_R, 0))
        make_face()
    fillet2_piece_15 = extrude(amount=87, mode=Mode.PRIVATE)
    fillet2_piece_15 = fillet2_piece_15 - Plane(origin=(0, 74.534164154, 30), x_dir=(0, 0, -1), z_dir=(0, -1, 0)) * Cylinder(20, 182, mode=Mode.PRIVATE)
    add(fillet2_piece_15, mode=Mode.SUBTRACT)
    with BuildSketch(Plane(origin=(0, 12, -20), x_dir=(-1, 0, 0), z_dir=(0, 0, -1))) as fillet2_piece_16:
        with BuildLine():
            CenterArc((20 - FILLET2_R, -FILLET2_R), FILLET2_R, 0, 90)
            Line((20, -FILLET2_R), (20, 0))
            Line((20, 0), (20 - FILLET2_R, 0))
        make_face()
    revolve(axis=Axis((0, 12, -20), (0, 1, 0)), revolution_arc=180, mode=Mode.SUBTRACT)
    with BuildSketch(Plane(origin=(0, 0, -20), x_dir=(-1, 0, 0), z_dir=(0, 0, -1))) as fillet2_piece_17:
        with BuildLine():
            CenterArc((20 - FILLET2_R, FILLET2_R), FILLET2_R, 270, 90)
            Line((20 - FILLET2_R, 0), (20, 0))
            Line((20, 0), (20, FILLET2_R))
        make_face()
    revolve(axis=Axis((0, 0, -20), (0, 1, 0)), revolution_arc=180, mode=Mode.SUBTRACT)
    with BuildSketch(Plane(origin=(-20, 57, -52), x_dir=(0, 0, -1), z_dir=(0, -1, 0))) as fillet2_piece_18:
        with BuildLine():
            CenterArc((18 - FILLET2_R, FILLET2_R), FILLET2_R, 270, 90)
            Line((18, FILLET2_R), (18, 0))
            Line((18, 0), (18 - FILLET2_R, 0))
        make_face()
    revolve(axis=Axis((-20, 57, -52), (1, 0, 0)), revolution_arc=90, mode=Mode.SUBTRACT)
    with BuildSketch(Plane(origin=(-20, 18, -52), x_dir=(0, -1, 0), z_dir=(0, 0, 1))) as fillet2_piece_19:
        with BuildLine():
            CenterArc((18 - FILLET2_R, FILLET2_R), FILLET2_R, 270, 90)
            Line((18, FILLET2_R), (18, 0))
            Line((18, 0), (18 - FILLET2_R, 0))
        make_face()
    revolve(axis=Axis((-20, 18, -52), (1, 0, 0)), revolution_arc=90, mode=Mode.SUBTRACT)


solid = part.part
